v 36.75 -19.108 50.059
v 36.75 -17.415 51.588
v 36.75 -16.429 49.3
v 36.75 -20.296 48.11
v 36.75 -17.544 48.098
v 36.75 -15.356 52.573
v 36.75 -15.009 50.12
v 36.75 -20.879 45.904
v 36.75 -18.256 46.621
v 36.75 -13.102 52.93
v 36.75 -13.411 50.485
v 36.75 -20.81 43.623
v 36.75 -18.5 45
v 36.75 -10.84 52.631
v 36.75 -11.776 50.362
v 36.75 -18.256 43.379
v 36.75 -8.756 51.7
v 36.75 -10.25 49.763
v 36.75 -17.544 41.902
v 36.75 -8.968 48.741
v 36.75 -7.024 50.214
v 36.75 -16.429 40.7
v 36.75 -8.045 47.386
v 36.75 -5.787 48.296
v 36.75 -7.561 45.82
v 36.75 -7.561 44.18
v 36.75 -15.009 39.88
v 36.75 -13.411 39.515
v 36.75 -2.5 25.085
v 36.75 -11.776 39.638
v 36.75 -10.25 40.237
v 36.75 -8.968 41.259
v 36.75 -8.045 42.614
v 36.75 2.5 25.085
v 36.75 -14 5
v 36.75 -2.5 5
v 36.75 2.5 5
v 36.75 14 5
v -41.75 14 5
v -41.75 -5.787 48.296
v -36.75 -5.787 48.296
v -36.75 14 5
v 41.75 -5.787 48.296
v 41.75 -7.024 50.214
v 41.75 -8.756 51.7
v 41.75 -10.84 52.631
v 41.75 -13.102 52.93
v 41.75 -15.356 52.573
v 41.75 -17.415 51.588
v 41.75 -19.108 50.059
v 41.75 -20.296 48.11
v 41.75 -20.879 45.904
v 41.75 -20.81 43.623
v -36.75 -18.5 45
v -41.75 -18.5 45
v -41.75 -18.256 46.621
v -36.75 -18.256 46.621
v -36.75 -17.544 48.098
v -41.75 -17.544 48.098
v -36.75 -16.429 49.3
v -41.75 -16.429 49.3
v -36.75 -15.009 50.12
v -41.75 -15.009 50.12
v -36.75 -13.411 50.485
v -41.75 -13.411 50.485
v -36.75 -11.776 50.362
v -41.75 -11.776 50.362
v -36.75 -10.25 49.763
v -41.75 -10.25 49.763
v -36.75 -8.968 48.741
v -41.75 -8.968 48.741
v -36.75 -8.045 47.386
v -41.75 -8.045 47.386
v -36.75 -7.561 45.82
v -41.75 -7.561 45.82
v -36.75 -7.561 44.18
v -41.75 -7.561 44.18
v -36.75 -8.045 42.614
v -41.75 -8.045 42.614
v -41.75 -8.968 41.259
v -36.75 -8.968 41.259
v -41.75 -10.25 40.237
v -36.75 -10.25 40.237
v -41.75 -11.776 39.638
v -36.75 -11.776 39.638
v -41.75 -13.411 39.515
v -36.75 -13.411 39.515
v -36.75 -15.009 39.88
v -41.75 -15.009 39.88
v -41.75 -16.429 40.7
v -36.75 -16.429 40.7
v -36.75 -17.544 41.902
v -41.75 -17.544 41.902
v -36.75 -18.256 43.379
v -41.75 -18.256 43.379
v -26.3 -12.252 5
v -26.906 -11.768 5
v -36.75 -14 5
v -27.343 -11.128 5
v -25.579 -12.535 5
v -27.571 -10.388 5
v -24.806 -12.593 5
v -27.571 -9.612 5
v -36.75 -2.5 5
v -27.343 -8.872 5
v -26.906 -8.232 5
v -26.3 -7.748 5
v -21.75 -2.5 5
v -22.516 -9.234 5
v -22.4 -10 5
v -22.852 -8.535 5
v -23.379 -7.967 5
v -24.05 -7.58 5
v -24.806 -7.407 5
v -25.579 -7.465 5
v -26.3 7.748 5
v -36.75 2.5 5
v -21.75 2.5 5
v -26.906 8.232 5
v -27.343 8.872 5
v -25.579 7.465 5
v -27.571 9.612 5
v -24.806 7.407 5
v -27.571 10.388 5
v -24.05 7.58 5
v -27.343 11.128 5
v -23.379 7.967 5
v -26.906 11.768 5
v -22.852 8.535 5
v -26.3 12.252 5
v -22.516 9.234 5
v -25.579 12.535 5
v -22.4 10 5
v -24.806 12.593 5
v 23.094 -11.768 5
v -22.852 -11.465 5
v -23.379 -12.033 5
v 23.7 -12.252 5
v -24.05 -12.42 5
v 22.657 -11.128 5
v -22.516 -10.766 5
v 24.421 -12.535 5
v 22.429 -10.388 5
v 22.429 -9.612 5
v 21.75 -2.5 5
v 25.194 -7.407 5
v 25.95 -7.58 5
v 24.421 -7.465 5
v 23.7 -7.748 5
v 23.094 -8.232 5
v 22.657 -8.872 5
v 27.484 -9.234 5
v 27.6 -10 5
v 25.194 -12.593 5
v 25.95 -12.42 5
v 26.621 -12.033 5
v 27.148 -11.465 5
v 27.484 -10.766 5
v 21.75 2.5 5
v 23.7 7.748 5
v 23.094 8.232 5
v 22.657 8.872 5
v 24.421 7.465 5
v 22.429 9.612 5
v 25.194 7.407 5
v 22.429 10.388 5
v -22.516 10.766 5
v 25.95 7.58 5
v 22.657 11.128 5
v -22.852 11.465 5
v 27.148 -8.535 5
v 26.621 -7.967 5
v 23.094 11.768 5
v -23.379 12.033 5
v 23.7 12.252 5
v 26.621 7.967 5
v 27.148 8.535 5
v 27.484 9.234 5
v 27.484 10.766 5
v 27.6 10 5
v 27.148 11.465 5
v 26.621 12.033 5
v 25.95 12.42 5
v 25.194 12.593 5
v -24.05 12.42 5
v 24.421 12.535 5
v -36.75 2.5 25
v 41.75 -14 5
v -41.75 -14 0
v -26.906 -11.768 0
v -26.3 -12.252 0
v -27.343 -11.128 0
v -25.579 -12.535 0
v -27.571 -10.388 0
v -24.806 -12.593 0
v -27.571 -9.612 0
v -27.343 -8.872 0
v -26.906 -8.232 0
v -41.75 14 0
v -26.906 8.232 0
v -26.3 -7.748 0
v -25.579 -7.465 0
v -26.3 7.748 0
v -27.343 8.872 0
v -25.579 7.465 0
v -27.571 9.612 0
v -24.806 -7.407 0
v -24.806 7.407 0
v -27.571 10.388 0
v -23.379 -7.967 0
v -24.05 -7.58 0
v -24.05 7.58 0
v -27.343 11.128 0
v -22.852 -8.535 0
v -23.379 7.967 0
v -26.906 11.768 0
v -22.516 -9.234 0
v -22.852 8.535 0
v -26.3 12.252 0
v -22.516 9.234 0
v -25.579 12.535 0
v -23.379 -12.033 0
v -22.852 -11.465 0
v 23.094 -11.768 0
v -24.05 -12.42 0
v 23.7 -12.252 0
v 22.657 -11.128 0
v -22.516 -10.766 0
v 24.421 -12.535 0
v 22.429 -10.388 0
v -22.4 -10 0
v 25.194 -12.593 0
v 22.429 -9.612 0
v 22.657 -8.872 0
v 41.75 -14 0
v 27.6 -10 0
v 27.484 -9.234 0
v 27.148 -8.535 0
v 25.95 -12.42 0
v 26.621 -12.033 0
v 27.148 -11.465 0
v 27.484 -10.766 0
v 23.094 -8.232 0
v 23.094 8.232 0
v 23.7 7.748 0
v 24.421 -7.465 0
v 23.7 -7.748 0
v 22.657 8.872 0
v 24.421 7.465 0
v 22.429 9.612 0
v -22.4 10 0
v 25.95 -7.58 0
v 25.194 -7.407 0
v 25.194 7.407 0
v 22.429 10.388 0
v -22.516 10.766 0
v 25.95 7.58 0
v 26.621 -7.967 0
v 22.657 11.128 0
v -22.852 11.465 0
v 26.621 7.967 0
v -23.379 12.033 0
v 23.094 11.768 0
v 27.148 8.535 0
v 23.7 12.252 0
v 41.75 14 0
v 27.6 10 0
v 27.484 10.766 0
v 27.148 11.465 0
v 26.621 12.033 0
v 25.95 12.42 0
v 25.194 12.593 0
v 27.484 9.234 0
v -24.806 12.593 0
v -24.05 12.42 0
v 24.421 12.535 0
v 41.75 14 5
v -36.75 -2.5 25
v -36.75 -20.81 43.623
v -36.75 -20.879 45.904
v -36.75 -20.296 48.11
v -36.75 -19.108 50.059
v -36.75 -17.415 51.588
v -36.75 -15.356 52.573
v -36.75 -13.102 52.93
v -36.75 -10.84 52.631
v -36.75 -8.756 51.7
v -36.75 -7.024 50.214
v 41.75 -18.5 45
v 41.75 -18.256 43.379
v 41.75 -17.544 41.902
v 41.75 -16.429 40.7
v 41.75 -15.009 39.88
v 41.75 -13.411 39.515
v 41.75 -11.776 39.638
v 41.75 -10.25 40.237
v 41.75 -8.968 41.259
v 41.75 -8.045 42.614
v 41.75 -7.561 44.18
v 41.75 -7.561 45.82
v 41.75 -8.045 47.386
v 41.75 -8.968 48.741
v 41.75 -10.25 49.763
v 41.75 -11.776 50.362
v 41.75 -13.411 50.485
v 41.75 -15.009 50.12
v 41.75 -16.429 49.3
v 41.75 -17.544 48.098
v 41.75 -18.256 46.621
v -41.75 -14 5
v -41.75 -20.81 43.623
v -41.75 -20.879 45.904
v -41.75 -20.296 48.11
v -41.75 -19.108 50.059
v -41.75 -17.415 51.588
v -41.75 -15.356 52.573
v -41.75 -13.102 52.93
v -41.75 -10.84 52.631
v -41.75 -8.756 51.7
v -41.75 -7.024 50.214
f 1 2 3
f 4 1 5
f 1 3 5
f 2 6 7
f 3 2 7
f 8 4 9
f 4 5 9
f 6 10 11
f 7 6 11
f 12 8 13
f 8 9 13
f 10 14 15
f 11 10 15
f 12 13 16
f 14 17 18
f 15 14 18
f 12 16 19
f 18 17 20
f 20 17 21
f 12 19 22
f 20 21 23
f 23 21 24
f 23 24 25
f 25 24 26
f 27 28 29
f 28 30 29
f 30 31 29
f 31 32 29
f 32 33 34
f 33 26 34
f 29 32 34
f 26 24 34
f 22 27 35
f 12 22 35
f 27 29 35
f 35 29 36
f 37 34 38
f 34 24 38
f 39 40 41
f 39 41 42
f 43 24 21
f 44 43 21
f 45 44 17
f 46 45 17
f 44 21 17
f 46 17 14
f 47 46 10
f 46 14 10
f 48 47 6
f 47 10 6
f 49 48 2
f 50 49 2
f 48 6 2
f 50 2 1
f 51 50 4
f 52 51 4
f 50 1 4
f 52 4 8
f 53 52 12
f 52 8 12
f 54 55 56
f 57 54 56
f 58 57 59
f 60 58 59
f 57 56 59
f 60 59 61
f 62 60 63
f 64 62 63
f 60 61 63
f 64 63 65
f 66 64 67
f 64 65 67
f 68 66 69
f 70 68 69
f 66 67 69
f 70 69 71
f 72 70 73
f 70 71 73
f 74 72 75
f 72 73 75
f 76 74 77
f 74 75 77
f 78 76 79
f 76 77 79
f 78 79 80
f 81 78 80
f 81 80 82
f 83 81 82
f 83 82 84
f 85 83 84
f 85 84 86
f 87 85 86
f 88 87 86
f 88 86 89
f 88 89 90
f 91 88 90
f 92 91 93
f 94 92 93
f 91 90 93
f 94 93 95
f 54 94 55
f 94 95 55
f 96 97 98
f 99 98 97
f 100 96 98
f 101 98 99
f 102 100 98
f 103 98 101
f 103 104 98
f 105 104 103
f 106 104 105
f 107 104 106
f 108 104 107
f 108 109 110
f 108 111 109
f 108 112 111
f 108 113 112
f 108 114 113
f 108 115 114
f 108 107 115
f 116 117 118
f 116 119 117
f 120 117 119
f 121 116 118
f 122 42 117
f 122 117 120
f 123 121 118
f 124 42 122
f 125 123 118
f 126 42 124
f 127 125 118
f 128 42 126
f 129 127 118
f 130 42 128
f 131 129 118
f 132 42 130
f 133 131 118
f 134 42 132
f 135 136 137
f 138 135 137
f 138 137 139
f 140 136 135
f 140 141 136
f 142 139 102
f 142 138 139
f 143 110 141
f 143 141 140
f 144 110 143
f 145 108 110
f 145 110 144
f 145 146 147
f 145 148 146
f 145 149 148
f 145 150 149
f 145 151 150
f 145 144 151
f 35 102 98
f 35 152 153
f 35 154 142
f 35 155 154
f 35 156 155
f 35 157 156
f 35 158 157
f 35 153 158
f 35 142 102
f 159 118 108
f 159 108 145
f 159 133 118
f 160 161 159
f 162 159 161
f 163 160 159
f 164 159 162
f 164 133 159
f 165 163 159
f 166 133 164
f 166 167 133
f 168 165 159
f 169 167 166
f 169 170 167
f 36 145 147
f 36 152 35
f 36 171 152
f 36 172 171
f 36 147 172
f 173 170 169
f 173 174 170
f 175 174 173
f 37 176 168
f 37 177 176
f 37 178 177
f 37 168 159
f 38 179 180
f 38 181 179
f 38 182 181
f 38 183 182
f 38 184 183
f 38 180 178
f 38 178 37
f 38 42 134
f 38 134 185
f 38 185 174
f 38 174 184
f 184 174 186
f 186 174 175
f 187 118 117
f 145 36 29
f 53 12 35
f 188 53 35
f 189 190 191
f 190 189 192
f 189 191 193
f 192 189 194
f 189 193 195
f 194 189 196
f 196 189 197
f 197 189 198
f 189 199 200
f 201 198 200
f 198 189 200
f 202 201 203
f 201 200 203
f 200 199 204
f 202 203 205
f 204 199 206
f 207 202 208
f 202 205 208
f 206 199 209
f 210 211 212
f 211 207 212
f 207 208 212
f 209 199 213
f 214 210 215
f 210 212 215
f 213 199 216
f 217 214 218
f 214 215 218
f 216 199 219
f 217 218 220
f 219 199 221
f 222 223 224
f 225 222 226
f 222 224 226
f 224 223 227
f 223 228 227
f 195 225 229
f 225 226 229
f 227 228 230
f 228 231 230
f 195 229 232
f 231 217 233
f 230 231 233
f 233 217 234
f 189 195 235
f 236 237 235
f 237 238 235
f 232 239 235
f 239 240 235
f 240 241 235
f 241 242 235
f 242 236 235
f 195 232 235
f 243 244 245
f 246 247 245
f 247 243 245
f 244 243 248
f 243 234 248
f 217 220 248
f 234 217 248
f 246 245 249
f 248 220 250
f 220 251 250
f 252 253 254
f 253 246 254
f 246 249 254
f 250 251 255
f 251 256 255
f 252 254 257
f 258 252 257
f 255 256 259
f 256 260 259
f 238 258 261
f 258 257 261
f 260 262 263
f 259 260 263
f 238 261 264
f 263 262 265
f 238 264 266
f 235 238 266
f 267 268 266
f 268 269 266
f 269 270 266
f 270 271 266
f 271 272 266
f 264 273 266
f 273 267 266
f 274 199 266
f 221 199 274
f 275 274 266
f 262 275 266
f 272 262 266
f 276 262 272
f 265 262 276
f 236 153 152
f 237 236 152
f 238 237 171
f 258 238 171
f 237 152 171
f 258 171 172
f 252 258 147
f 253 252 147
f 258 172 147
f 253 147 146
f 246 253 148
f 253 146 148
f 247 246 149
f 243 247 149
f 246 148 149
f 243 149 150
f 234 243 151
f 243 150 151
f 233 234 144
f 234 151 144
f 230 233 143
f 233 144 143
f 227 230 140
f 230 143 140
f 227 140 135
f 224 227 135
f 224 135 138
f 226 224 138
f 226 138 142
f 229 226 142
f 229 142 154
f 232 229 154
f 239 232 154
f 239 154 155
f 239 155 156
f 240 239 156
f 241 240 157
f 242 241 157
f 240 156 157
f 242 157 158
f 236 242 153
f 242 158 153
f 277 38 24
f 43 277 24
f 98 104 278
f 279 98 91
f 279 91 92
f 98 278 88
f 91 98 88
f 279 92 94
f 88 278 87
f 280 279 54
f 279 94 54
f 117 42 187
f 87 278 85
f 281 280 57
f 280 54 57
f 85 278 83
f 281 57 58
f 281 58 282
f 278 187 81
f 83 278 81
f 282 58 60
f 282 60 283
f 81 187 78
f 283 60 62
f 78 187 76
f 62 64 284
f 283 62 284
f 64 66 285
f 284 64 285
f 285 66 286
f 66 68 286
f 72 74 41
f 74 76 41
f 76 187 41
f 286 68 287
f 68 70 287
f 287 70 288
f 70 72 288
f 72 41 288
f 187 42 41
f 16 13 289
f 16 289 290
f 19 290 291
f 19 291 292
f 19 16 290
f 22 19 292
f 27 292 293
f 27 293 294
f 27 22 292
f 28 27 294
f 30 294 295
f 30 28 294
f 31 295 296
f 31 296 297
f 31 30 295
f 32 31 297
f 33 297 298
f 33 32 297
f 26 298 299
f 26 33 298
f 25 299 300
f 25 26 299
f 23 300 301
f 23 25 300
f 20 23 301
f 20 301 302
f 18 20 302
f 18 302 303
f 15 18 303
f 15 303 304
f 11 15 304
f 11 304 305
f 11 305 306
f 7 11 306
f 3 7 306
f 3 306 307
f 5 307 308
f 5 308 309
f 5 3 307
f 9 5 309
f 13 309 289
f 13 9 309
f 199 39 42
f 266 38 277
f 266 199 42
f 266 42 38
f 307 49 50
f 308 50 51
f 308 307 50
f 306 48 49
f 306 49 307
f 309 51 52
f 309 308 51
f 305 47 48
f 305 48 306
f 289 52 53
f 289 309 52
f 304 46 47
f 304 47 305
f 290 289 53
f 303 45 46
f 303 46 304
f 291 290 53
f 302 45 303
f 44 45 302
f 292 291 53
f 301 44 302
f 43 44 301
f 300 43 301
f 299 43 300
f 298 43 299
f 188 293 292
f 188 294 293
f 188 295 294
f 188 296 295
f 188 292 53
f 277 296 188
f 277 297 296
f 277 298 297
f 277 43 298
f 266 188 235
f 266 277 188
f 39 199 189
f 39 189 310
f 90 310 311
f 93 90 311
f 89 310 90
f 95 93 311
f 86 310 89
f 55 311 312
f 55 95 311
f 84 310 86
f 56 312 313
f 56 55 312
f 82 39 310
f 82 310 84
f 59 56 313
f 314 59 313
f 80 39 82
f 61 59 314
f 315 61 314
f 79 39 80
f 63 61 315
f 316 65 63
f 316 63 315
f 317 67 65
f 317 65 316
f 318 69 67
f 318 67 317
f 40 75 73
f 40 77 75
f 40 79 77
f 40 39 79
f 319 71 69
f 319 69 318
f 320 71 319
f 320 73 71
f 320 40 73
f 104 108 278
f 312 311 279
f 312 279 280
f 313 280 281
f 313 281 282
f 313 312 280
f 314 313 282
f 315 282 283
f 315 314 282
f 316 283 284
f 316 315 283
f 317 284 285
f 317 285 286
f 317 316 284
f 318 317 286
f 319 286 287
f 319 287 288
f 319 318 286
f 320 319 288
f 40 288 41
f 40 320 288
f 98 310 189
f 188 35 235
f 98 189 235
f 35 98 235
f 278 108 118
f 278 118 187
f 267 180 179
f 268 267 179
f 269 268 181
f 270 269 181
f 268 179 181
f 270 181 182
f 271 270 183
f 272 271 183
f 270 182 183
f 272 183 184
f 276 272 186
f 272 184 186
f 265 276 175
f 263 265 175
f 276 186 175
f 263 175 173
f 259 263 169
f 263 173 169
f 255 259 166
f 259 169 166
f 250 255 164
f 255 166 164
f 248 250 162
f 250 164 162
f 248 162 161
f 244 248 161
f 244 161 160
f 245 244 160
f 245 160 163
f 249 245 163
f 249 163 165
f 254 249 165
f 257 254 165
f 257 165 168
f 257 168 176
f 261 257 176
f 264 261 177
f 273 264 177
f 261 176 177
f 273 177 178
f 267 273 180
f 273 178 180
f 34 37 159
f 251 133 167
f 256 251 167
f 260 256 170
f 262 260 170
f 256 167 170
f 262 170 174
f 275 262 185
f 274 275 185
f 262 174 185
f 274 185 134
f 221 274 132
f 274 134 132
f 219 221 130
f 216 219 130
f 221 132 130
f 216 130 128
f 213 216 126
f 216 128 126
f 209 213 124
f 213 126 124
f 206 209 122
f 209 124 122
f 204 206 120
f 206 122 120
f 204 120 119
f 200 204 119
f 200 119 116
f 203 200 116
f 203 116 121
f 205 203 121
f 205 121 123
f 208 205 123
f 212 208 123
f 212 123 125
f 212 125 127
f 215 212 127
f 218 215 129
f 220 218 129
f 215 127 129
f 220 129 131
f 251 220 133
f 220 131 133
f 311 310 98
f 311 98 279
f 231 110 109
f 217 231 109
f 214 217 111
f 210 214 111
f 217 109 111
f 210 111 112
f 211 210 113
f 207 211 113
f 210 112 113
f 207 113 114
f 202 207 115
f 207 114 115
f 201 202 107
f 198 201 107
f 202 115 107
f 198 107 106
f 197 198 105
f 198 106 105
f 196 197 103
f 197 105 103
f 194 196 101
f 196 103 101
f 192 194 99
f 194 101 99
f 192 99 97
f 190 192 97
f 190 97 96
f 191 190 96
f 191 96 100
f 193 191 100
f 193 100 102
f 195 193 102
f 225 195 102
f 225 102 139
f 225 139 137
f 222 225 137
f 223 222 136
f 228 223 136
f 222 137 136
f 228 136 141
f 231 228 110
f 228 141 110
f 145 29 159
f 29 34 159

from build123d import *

# Parameters (mm, degrees)
SKETCH_1_W          = 83.5
SKETCH_1_H          = 28
EXTRUDE_1_DEPTH     = 5
SKETCH_2_R          = 5.5
EXTRUDE_2_DEPTH     = 5
EXTRUDE_START       = -5
SKETCH_3_R          = 5.5
EXTRUDE_3_DEPTH     = 5
SKETCH_4_R          = 2.6
CUT_EXTRUDE_2_DEPTH = 5
EXTRUDE_4_DEPTH     = 2.5


with BuildPart() as part:
    # 草图1 → 凸台-拉伸1 (new body)
    with BuildSketch(Plane.XY):
        Rectangle(SKETCH_1_W, SKETCH_1_H)
    extrude(amount=EXTRUDE_1_DEPTH)

    # 草图2 → 凸台-拉伸2 (add)
    with BuildSketch(Plane.ZY.offset(41.75)):
        with BuildLine():
            Line((5, 14), (5, -14))
            Line((5, -14), (43.622842344, -20.810249177))
            ThreePointArc((43.622842344, -20.810249177), (52.5727616, -15.355809237), (48.296475179, -5.786831015))
            Line((48.296475179, -5.786831015), (5, 14))
        make_face()
        with Locations(Location((45, -13, 0), (0, 0, 270))):
            Circle(SKETCH_2_R, mode=Mode.SUBTRACT)
    extrude(amount=-EXTRUDE_2_DEPTH)

    # 草图3 → 凸台-拉伸3 (add)
    with BuildSketch(Plane(origin=(41.75, 0, 0), x_dir=(0, 0, -1), z_dir=(1, 0, 0)).offset(EXTRUDE_START)):
        with BuildLine():
            Line((-5, 14), (-48.296475179, -5.786831015))
            ThreePointArc((-48.296475179, -5.786831015), (-52.5727616, -15.355809237), (-43.622842344, -20.810249177))
            Line((-43.622842344, -20.810249177), (-5, -14))
            Line((-5, -14), (-5, 14))
        make_face()
        with Locations(Location((-45, -13, 0), (0, 0, 270))):
            Circle(SKETCH_3_R, mode=Mode.SUBTRACT)
    extrude(amount=EXTRUDE_3_DEPTH)

    # 草图4 → 切除-拉伸2 (cut)
    with BuildSketch(Plane.XY.offset(5)):
        with Locations((-25, 10)):
            Circle(SKETCH_4_R)
        with Locations((25, 10)):
            Circle(SKETCH_4_R)
        with Locations((25, -10)):
            Circle(SKETCH_4_R)
        with Locations((-25, -10)):
            Circle(SKETCH_4_R)
    extrude(amount=-CUT_EXTRUDE_2_DEPTH, mode=Mode.SUBTRACT)

    # 草图5 → 凸台-拉伸4 (add, symmetric)
    with BuildSketch(Plane(origin=(0, 0, 0), x_dir=(1, 0, 0), z_dir=(0, 1, 0))):
        Polygon((-36.75, -5), (-21.75, -5), (-36.75, -25), align=None)
        Polygon((36.75, -5), (36.75, -25.085459481), (21.75, -5), align=None)
    extrude(amount=EXTRUDE_4_DEPTH, both=True)


solid = part.part
